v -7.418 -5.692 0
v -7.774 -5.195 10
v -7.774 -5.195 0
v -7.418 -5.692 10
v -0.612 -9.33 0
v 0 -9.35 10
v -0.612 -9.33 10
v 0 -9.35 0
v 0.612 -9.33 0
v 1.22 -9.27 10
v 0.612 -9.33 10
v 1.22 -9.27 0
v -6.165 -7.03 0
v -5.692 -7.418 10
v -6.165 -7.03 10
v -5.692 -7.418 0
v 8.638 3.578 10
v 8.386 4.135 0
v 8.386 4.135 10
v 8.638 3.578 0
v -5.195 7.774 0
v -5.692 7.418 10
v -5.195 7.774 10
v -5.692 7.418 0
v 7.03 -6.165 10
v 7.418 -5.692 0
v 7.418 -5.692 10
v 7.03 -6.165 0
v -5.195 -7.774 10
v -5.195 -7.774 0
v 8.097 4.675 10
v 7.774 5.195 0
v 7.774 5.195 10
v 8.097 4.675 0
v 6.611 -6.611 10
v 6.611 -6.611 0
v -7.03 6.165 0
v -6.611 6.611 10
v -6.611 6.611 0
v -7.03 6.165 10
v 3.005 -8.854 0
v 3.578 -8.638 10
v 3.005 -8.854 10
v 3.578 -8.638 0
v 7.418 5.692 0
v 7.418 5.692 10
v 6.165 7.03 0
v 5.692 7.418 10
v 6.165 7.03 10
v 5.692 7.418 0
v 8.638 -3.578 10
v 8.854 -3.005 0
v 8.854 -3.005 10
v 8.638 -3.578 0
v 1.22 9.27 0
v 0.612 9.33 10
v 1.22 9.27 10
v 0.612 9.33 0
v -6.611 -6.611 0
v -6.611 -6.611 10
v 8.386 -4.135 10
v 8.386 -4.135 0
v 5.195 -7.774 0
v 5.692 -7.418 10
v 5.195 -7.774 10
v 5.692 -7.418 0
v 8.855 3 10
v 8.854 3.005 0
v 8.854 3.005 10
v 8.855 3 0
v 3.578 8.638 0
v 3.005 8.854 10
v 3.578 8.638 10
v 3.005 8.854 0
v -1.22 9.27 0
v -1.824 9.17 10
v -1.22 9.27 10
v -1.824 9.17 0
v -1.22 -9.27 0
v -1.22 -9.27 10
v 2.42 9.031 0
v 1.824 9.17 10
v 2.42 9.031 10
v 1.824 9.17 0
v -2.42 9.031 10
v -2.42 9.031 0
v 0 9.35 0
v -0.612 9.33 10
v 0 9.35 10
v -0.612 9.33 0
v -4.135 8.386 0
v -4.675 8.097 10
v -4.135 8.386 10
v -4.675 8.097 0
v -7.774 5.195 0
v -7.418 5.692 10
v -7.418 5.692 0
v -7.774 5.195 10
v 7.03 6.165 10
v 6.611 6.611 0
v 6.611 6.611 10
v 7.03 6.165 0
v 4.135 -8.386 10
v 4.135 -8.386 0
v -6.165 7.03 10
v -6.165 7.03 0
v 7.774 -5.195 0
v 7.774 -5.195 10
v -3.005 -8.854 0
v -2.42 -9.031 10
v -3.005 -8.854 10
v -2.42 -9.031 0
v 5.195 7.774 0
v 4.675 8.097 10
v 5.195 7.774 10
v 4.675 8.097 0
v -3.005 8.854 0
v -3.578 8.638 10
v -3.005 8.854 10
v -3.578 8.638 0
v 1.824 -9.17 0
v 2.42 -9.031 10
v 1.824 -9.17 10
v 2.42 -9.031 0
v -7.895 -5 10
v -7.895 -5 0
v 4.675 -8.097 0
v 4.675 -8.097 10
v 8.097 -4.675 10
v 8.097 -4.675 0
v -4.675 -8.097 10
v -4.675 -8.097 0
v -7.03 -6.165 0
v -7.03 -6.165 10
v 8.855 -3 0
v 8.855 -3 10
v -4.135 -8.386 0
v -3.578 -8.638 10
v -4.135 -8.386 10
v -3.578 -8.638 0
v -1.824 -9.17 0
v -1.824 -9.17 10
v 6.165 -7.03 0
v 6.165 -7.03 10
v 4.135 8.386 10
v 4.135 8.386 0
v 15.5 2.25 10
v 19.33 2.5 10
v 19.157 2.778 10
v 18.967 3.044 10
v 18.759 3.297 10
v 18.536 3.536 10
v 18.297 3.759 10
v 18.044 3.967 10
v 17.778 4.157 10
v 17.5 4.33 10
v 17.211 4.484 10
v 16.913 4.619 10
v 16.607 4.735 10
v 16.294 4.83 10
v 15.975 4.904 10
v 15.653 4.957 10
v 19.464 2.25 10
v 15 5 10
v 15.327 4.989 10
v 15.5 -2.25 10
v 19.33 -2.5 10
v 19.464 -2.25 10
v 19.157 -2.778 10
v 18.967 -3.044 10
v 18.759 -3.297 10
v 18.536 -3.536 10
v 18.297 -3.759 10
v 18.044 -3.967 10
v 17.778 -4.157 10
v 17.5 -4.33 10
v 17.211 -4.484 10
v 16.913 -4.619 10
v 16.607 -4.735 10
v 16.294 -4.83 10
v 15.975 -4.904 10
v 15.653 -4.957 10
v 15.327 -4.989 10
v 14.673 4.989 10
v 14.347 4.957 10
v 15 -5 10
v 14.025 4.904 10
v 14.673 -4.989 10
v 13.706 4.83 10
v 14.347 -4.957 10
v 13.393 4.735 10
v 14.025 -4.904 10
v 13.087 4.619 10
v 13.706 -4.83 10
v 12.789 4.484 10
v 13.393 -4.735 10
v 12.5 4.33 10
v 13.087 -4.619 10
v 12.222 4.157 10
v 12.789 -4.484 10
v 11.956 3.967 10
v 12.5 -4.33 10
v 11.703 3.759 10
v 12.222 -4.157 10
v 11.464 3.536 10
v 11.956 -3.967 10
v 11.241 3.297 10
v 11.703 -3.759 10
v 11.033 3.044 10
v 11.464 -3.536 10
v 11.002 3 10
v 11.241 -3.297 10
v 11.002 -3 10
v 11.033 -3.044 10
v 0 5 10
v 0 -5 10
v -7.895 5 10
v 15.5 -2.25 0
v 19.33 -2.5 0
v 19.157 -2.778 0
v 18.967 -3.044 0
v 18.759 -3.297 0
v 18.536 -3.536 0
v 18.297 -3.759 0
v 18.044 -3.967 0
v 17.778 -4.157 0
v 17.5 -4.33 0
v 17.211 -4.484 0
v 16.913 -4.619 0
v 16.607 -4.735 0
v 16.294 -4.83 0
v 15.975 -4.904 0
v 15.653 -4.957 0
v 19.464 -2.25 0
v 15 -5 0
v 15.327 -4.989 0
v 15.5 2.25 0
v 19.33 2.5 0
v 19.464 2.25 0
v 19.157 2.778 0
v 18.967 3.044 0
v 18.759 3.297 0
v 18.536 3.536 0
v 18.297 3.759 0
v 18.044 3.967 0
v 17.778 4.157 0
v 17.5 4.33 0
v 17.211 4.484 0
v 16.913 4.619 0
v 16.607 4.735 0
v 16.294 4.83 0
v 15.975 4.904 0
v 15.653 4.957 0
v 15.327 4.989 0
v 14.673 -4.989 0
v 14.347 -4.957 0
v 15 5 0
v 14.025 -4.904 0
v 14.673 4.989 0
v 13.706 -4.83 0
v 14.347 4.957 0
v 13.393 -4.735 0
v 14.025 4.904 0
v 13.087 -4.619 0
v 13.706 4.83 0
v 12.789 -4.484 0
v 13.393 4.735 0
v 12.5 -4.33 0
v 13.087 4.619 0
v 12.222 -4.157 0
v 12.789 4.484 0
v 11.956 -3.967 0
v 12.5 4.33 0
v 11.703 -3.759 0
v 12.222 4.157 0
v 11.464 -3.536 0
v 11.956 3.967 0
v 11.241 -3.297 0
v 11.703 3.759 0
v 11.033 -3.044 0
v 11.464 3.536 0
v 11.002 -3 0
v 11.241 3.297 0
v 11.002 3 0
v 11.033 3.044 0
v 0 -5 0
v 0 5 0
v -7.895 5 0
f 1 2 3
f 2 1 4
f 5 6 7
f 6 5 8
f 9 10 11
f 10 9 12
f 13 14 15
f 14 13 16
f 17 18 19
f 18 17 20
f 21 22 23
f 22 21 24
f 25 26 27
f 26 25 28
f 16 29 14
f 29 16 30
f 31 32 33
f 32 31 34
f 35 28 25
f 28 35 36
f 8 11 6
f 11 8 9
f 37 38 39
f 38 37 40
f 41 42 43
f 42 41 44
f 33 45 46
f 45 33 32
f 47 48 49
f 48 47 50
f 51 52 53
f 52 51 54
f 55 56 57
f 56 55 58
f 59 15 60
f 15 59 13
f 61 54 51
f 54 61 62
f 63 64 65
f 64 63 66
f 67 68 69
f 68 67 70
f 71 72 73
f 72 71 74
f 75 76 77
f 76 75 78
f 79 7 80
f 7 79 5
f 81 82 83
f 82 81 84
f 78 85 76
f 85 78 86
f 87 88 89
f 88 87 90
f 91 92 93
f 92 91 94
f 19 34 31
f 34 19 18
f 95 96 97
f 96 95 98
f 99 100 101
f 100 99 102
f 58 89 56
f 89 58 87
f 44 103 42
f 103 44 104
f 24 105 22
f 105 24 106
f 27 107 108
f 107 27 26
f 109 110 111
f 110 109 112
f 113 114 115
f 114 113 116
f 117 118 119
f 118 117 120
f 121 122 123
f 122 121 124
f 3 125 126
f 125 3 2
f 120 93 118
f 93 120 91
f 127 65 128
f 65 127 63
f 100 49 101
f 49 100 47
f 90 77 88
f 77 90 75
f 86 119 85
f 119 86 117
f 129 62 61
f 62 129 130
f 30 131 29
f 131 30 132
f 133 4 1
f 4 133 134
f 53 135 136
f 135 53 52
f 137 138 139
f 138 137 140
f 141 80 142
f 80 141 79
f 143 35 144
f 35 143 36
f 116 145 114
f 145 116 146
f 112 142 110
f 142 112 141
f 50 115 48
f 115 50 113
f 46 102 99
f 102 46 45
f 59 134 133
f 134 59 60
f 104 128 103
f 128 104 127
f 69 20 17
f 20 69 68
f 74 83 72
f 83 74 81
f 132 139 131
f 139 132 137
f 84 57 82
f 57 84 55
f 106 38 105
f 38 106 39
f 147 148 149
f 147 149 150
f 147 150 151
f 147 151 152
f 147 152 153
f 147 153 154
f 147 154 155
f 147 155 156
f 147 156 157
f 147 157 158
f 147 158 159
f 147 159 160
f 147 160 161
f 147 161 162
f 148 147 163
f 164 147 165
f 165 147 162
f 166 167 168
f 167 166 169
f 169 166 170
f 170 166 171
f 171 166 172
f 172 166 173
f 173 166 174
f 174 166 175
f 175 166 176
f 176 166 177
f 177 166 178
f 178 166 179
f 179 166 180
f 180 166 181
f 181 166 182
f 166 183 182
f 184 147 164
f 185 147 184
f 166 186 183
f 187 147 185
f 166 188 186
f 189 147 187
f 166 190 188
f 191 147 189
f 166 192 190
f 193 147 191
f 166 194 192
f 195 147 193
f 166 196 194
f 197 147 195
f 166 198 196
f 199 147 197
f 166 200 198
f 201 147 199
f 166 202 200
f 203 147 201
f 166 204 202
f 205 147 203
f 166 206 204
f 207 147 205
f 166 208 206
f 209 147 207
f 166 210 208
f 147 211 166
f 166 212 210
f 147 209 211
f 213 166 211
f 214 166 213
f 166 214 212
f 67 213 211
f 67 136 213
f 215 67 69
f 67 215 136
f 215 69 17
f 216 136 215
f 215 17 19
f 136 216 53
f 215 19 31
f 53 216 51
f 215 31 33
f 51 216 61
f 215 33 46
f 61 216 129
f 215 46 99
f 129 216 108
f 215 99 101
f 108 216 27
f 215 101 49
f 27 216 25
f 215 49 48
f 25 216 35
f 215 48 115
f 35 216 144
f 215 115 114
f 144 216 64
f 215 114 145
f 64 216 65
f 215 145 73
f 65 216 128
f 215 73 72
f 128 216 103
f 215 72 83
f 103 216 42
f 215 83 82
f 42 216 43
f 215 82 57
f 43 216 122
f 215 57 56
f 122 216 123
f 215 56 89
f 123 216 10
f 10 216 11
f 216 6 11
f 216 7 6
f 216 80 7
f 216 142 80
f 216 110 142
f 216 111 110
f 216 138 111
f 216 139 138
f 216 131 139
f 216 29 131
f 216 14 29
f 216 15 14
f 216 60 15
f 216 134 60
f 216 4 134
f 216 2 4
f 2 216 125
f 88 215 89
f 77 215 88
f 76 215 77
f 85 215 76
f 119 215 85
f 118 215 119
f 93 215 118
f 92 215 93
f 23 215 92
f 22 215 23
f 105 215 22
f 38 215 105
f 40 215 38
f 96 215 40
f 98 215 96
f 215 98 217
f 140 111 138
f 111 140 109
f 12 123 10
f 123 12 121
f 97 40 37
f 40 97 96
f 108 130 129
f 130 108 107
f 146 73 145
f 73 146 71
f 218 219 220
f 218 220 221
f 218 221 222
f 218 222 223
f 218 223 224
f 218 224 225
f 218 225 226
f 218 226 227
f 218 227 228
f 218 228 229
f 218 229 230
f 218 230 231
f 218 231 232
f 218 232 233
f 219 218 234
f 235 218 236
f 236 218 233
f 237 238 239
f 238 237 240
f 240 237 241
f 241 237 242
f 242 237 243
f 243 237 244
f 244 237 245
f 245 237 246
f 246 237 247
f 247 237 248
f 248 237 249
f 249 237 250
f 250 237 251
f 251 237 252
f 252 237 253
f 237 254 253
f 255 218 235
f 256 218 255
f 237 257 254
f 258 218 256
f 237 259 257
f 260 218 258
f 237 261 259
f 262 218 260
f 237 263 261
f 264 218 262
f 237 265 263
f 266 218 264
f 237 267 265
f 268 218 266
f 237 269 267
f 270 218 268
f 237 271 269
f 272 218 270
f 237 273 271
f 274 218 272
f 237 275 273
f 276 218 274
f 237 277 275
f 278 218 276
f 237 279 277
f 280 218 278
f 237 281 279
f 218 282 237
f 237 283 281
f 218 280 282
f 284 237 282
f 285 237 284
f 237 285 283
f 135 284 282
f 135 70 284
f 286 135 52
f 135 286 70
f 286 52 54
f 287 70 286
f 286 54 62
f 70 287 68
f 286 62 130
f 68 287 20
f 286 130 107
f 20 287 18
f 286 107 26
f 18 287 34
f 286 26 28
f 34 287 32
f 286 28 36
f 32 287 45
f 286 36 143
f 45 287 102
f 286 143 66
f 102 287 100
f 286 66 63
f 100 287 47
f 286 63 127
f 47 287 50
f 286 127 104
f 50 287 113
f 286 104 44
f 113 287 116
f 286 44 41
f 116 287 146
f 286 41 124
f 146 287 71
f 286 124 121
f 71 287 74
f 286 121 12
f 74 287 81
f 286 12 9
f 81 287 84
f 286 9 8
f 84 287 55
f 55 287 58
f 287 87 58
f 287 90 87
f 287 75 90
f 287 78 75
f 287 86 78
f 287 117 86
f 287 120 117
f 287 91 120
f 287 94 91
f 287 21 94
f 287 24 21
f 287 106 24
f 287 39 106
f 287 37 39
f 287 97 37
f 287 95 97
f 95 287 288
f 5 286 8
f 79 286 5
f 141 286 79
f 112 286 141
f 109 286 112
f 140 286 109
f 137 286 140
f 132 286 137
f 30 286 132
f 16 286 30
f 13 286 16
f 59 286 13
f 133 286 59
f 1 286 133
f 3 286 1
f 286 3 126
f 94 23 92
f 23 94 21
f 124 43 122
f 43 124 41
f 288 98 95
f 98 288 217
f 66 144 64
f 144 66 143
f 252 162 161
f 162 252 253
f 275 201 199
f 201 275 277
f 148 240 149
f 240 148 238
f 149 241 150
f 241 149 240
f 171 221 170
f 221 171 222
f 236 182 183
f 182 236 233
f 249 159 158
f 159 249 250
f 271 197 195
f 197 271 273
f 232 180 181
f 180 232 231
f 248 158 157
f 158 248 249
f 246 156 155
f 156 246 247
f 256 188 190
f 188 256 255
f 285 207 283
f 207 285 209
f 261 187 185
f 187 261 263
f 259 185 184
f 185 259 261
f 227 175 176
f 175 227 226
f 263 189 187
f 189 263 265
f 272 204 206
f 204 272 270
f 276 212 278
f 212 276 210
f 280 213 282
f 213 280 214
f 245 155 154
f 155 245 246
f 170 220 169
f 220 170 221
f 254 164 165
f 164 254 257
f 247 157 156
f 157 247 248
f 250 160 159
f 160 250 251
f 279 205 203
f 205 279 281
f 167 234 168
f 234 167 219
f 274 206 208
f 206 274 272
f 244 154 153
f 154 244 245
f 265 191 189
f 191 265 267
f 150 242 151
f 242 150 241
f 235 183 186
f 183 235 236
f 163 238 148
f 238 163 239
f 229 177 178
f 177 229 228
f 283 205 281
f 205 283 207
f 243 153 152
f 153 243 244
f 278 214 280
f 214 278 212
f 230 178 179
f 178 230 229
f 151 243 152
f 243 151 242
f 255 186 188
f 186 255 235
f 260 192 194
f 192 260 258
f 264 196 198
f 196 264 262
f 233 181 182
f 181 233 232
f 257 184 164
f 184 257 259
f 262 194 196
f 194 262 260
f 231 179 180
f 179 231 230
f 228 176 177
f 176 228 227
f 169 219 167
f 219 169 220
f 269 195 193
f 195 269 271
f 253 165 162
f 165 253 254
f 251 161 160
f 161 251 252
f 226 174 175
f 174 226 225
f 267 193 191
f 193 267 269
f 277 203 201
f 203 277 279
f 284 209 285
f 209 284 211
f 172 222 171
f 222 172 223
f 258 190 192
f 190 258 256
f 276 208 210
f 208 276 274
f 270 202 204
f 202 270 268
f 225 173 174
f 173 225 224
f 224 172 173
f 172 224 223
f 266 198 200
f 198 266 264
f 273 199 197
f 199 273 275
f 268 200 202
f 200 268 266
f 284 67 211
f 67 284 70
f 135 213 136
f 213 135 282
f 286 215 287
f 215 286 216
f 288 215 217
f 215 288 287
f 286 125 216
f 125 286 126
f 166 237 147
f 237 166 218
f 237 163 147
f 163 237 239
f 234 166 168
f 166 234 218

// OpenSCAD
// Tubing clip for 12.7 mm stand rod
// Print orientation: flat on bed, extrusion along +Z

$fn = 96;

// ---- Dimensions (mm) ----
rod_d      = 12.7;   // stand rod diameter
ring_w     = 3;      // rod ring wall thickness
rod_r      = rod_d/2 + ring_w; // rod ring outer radius (18.7/2)
opening_w  = 10;     // rod ring opening width (-X side)

tube_d     = 6;      // tubing inner diameter
tube_w     = 2;      // tubing wall thickness
tube_r     = tube_d/2 + tube_w; // tubing outer radius (8/2)
tube_x     = 15;     // tubing ring centre X
opening_t  = 4.5;    // tubing opening width (+X side)

bridge_w   = 6;      // bridge width (Y)
bridge_x0  = 8;      // bridge start X
bridge_x1  = 12;     // bridge end X

eps        = 0.5;    // cut overshoot

// ---- Model ----
difference() {
    union() {
        // Rod ring
        cylinder(r = rod_r, h = 10);
        // Tubing ring
        translate([tube_x, 0, 0])
            cylinder(r = tube_r, h = 10);
        // Bridge
        translate([bridge_x0, -bridge_w/2, 0])
            cube([bridge_x1 - bridge_x0, bridge_w, 10]);
    }
    // Rod opening
    translate([-rod_r - eps, -opening_w/2, 0])
        cube([rod_r + eps, opening_w, 10]);
    // Tubing opening
    translate([tube_x + eps, -opening_t/2, 0])
        cube([rod_r + 2*eps, opening_t, 10]);
}
